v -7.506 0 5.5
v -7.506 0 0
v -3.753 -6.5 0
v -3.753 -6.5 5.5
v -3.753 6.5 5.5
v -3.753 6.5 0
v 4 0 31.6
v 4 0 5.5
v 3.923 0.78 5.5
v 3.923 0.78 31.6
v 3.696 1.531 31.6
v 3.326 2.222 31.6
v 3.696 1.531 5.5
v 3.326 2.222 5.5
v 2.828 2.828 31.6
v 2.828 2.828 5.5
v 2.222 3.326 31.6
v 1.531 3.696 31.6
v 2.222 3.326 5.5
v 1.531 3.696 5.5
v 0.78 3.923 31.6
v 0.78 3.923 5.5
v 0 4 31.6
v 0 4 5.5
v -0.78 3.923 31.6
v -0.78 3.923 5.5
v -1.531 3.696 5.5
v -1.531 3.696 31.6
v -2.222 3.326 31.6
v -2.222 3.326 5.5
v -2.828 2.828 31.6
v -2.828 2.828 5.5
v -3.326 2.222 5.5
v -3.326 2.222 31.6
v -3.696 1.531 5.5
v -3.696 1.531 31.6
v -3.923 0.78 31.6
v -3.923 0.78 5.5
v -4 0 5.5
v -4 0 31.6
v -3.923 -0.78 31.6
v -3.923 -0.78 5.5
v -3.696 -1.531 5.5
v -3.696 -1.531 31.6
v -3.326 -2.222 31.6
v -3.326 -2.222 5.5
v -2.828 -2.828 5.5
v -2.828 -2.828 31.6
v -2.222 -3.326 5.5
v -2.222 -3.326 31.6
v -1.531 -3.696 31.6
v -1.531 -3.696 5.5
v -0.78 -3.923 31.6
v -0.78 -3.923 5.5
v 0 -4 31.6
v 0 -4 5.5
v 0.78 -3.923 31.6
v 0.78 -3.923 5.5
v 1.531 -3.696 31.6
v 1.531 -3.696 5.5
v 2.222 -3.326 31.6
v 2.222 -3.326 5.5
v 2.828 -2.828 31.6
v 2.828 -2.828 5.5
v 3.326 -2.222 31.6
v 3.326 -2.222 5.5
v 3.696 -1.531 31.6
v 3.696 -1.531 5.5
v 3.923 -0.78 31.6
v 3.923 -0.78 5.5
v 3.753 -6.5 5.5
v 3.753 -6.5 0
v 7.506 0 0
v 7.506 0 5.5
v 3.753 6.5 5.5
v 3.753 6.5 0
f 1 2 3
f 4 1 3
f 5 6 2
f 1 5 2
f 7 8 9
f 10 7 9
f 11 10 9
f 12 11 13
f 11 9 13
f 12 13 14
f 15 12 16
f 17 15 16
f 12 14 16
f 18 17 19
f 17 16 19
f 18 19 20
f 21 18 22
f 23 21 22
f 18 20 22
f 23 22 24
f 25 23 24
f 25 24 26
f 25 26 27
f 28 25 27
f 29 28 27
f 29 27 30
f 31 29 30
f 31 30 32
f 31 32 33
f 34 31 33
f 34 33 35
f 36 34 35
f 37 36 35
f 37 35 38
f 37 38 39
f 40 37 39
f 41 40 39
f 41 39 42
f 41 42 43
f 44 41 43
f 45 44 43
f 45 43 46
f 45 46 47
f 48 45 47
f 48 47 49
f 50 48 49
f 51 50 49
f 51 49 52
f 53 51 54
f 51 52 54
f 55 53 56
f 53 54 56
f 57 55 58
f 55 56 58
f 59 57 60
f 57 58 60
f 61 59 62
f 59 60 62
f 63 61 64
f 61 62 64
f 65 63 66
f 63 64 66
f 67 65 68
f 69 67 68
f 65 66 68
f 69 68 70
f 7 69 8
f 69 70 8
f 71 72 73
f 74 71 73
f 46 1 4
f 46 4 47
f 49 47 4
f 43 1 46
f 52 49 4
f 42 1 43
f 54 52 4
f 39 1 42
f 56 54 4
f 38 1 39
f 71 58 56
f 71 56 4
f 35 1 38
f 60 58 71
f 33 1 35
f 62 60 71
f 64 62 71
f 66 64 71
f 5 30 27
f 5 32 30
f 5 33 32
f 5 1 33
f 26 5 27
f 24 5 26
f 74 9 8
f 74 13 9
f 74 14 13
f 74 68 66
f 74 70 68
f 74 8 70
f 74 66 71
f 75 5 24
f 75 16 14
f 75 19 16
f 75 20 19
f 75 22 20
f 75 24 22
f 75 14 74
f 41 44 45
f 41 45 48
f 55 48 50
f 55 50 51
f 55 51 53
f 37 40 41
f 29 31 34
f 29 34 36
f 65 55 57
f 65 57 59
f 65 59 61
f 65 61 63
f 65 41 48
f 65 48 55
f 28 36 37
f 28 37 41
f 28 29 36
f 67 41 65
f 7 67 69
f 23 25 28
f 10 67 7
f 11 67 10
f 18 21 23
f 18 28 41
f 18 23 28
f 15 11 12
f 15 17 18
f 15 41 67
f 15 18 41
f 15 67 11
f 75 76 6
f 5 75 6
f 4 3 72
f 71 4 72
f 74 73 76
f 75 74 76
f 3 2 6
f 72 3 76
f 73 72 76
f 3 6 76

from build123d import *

# Parameters (mm, degrees)
PAD002_DEPTH = 5.5
SKETCH005_R  = 4
PAD003_DEPTH = 26.1


with BuildPart() as part:
    # Sketch004 → Pad002 (new body)
    with BuildSketch(Plane.XY):
        Polygon((7.5055534995, 0), (3.7527767497, 6.5), (-3.7527767497, 6.5), (-7.5055534995, 0), (-3.7527767497, -6.5), (3.7527767497, -6.5), align=None)
    extrude(amount=PAD002_DEPTH)

    # Sketch005 (on Face8 of Pad002) → Pad003 (join)
    with BuildSketch(Plane.XY.offset(5.5)):
        Circle(SKETCH005_R)
    extrude(amount=PAD003_DEPTH)

    # Sketch006 → Groove (revolve, cut)
    with BuildSketch(Plane.XZ):
        Polygon((4, 31.6), (4.5, 31.6), (4, 31.1), align=None)
        Polygon((7.5055534995, 0), (6.3055534995, 0), (7.5055534995, -0.5), align=None)
        Polygon((7.5055534995, 5.5), (6.3055534995, 5.5), (7.5055534995, 6), align=None)
    revolve(axis=Axis((0, 0, 0), (0, 0, 1)), mode=Mode.SUBTRACT)


solid = part.part
